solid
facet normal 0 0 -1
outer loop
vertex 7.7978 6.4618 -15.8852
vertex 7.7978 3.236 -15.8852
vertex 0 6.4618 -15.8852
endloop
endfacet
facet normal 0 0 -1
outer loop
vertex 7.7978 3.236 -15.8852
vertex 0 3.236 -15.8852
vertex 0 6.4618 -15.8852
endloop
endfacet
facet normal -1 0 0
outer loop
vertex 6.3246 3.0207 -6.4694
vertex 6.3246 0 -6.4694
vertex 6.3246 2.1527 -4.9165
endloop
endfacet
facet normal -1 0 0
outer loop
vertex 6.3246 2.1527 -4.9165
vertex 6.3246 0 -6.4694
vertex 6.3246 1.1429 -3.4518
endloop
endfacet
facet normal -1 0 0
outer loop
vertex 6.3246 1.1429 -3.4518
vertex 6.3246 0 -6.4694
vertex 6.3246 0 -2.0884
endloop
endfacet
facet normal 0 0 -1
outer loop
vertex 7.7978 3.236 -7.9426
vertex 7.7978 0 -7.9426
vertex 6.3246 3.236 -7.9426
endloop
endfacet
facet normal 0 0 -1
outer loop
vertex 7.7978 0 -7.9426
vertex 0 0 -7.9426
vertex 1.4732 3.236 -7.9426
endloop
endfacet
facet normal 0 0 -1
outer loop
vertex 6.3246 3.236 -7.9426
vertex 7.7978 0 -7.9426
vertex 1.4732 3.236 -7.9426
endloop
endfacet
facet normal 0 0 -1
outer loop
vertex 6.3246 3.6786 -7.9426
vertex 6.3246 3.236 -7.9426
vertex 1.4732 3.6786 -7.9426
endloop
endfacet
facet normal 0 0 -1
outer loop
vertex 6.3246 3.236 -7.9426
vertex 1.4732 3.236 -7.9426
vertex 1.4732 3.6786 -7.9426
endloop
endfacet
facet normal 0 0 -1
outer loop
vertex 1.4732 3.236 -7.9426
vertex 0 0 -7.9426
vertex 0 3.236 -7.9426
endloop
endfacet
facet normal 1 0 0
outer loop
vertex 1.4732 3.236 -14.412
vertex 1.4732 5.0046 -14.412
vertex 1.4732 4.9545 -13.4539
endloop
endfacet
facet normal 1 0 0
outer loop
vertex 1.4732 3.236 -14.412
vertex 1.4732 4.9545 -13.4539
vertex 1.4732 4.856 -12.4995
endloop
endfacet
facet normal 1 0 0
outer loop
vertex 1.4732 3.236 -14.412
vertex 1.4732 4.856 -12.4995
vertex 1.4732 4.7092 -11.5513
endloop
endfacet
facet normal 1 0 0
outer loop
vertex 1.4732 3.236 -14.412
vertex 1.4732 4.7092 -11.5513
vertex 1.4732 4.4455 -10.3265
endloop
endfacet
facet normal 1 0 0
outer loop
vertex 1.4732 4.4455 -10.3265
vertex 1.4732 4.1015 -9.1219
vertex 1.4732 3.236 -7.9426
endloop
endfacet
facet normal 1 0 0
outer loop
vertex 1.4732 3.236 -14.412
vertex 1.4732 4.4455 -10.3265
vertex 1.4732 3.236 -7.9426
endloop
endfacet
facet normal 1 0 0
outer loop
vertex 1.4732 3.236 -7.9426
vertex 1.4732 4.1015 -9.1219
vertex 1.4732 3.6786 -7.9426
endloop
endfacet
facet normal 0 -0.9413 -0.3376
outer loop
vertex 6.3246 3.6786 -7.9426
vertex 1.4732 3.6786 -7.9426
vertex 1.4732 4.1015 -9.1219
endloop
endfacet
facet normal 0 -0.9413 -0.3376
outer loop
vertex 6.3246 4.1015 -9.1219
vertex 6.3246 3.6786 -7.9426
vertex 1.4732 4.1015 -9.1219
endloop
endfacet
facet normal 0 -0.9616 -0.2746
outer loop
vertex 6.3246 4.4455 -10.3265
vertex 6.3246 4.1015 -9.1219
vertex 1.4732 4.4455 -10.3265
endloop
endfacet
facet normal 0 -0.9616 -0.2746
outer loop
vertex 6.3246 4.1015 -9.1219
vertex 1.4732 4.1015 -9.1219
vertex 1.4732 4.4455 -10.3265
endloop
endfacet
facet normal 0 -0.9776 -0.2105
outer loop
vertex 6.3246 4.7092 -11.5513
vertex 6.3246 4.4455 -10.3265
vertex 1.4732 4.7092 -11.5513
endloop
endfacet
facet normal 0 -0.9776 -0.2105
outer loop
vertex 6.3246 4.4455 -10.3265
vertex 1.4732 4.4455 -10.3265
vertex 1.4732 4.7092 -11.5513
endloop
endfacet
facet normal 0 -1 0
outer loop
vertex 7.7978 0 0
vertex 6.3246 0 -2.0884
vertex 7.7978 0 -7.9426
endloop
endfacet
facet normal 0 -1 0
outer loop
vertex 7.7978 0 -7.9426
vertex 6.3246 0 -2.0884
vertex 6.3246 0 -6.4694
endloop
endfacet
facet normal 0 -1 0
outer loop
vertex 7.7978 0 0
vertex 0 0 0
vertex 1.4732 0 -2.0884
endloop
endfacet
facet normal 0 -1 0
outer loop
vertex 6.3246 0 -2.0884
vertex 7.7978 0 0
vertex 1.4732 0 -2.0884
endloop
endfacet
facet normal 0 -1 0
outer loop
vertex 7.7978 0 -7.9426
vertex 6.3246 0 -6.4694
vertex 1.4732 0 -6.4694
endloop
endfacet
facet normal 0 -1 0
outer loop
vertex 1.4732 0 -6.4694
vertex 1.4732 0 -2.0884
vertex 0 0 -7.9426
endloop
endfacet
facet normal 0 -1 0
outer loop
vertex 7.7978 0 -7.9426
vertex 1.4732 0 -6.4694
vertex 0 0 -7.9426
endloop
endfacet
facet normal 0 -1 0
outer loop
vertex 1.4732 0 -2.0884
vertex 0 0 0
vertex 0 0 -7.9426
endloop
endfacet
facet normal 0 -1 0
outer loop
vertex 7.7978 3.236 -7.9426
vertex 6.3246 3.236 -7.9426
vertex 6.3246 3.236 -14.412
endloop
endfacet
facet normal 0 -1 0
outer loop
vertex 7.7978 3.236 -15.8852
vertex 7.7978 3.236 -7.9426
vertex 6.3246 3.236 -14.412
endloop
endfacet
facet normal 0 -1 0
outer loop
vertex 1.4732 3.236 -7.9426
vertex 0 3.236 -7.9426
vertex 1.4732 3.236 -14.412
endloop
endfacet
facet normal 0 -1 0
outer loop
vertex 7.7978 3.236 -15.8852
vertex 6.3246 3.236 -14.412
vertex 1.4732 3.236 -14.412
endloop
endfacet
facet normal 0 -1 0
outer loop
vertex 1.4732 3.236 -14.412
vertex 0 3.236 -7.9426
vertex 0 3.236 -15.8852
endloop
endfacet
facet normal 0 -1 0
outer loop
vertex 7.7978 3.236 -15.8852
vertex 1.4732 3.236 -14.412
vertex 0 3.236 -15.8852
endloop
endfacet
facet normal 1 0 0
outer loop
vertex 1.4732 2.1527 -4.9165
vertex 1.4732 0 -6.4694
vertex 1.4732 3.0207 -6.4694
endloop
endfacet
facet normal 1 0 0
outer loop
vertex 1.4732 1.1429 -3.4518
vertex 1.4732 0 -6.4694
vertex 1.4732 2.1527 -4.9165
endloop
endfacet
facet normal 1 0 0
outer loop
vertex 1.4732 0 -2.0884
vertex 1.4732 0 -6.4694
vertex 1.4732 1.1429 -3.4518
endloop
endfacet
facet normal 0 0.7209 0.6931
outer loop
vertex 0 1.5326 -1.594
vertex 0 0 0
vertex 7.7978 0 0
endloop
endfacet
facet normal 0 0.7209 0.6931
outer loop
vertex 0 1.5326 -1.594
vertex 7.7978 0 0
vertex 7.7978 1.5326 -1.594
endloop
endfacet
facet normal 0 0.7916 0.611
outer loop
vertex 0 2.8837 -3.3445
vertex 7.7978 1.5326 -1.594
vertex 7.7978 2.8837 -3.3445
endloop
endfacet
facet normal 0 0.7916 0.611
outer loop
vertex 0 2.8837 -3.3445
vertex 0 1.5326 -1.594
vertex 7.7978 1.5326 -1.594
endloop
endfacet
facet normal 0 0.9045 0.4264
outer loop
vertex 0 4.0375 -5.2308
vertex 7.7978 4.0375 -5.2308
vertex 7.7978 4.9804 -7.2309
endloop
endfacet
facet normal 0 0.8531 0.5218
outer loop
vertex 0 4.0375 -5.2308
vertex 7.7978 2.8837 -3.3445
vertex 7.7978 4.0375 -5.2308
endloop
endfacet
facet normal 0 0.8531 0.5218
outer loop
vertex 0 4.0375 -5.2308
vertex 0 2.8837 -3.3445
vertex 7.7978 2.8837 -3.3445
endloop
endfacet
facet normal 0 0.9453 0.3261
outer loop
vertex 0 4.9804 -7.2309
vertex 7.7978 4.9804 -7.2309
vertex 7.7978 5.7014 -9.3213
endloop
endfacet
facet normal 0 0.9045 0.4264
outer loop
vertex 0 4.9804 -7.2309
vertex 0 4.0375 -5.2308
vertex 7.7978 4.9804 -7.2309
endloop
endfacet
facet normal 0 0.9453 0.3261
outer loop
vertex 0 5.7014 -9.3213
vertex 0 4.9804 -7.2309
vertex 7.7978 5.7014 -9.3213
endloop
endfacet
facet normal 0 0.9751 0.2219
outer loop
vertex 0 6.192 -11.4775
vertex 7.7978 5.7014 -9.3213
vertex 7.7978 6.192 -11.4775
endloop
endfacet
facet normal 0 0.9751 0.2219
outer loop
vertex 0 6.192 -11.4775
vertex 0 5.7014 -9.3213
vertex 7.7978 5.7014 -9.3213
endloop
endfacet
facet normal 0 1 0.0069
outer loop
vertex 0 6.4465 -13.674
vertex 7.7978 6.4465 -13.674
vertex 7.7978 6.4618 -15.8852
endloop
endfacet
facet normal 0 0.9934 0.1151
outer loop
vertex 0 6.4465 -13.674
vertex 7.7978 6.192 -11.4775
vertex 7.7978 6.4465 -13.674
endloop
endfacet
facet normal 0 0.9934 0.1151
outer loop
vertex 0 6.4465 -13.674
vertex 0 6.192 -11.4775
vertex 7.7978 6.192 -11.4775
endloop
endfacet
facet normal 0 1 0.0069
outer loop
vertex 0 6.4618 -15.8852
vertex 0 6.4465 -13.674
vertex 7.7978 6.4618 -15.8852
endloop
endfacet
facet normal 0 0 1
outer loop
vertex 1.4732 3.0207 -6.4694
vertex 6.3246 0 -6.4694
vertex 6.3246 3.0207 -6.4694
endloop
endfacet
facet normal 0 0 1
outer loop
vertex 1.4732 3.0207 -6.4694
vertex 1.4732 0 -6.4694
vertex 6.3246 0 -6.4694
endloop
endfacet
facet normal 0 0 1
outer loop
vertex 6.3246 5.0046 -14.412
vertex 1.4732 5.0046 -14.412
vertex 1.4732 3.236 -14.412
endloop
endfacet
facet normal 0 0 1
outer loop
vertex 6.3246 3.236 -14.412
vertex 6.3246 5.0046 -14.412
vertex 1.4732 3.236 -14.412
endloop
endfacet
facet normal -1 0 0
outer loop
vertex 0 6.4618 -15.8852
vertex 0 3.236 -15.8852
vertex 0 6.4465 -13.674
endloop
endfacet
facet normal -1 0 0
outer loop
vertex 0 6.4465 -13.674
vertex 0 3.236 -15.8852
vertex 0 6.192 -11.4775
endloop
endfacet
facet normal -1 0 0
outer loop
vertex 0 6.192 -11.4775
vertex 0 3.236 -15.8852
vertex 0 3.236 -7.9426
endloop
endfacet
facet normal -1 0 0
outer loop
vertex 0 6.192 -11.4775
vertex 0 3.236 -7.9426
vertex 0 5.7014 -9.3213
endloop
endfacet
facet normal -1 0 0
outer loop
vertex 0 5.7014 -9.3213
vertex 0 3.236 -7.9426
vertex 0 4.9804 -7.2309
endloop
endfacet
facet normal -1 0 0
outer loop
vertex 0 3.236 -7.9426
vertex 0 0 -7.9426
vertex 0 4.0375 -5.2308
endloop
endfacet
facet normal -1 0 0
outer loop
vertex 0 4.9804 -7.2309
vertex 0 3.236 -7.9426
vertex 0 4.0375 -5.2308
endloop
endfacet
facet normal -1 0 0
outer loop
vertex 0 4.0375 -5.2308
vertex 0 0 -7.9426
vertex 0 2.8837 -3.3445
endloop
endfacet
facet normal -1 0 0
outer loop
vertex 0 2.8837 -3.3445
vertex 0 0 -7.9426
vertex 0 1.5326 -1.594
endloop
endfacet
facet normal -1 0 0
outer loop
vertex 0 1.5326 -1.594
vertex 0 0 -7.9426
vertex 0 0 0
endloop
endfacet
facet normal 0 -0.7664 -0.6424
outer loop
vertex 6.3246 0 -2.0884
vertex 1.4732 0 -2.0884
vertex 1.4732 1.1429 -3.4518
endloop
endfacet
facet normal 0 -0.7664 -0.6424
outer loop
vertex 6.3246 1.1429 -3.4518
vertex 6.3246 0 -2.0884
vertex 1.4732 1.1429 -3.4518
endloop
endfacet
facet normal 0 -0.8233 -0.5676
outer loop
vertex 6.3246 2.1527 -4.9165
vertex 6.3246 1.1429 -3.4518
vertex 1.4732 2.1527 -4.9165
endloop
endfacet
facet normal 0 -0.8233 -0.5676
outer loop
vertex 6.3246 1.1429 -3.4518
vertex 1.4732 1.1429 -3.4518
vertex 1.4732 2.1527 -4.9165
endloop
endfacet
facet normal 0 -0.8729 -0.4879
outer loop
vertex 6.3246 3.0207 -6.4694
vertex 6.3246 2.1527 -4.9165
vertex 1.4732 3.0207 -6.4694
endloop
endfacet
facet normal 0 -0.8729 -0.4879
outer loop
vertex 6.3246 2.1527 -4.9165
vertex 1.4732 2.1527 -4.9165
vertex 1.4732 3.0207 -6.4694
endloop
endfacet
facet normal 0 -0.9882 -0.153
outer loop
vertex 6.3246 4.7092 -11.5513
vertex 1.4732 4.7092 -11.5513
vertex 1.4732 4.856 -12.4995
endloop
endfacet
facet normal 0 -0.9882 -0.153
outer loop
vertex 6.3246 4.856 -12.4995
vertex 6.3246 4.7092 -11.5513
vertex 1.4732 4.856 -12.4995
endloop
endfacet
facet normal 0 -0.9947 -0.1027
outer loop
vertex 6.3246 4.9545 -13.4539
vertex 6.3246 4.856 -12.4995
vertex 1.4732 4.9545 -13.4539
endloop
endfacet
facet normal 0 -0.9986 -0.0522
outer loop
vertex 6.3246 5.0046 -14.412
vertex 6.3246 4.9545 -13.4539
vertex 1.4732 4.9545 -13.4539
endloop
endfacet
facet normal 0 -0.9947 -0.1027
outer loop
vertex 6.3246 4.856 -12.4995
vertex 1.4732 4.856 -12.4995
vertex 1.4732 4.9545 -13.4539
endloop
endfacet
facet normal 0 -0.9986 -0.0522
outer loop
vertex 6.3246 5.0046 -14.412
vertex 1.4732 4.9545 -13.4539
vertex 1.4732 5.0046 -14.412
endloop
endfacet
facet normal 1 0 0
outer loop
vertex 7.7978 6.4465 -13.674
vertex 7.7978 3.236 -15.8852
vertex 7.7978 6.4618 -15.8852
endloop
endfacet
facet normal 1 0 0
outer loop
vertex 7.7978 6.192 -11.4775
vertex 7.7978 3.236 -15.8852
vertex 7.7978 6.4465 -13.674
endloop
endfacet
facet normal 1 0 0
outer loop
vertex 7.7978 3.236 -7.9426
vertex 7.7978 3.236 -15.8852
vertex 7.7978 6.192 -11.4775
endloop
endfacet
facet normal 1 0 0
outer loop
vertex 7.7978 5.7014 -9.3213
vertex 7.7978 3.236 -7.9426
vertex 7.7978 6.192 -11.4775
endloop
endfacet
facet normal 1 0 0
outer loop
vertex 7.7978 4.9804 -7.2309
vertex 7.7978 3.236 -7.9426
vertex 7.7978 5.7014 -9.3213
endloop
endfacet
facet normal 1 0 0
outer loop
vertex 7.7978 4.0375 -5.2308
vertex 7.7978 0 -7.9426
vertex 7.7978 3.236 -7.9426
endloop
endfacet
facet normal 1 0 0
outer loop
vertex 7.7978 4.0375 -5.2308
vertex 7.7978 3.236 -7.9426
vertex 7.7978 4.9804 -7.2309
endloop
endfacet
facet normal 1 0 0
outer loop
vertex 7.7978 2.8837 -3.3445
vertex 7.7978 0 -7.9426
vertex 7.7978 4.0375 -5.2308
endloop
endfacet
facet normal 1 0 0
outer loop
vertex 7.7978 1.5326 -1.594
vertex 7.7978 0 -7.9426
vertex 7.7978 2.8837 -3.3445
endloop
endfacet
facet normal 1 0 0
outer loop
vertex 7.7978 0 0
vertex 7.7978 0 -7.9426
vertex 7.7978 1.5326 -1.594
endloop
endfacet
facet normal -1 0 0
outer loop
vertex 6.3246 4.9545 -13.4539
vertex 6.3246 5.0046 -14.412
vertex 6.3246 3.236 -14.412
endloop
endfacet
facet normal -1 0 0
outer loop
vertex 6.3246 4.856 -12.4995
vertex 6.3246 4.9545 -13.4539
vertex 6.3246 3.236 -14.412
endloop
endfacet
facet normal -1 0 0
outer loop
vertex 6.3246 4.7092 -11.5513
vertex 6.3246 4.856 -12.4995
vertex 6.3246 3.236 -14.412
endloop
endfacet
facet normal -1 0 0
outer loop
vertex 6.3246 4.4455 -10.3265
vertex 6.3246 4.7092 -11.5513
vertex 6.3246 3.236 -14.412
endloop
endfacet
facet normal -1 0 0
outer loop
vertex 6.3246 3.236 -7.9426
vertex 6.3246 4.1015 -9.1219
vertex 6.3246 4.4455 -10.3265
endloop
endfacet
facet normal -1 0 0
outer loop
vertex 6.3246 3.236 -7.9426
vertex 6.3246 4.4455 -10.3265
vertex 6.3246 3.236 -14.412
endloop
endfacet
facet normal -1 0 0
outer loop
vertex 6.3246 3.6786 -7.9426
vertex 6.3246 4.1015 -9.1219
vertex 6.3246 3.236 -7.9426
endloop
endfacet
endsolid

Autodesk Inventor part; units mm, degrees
ref_plane "YZ Plane" through (0, 0, 0) normal (1, 0, 0) x (0, 1, 0)
ref_plane "XZ Plane" through (0, 0, 0) normal (0, 1, 0) x (-1, 0, 0)
sketch "Sketch1" plane through (0, 0, 0) normal (1, 0, 0) x (0, 1, 0)
  line L0 (0, 0) -> (0, -7.9426)
  line L1 (0, -7.9426) -> (3.236, -7.9426)
  line L2 (3.236, -7.9426) -> (3.236, -15.8852)
  line L3 (3.236, -15.8852) -> (6.4618, -15.8852)
  arc A0 (6.4618, -15.8852) -> (0, 0) centre (-13.924, -14.9208) ccw
  dimension "d0" = 7.9426
  dimension "d1" = 3.236
  dimension "d2" = 7.9426
  dimension "d3" = 3.2258
extrude "Extrusion1" add sketch "Sketch1" along normal blind 7.7978
shell "Shell1" thickness 1.4732 removed faces 1 at (2.5993, 0, -2.6475)
ref_plane "Work Plane1" through (1.4732, 0, 0) normal (-1, 0, 0) x (0, 0, 1)
sketch "Sketch4" plane through (1.4732, 0, 0) normal (-1, 0, 0) x (0, 0, 1)
  line L0 (-7.9426, 3.236) -> (-15.8852, 3.236) projected
  line L1 (-15.8852, 3.236) -> (-15.8852, 6.4618) projected
  arc A0 (0, 0) -> (-15.8852, 6.4618) centre (-14.9208, -13.924) ccw projected
  line L2 (-14.412, 4.7092) -> (-14.412, 5.0045)
  arc A1 (-7.9426, 3.6786) -> (-14.412, 5.0045) centre (-14.9208, -13.924) ccw
  line L3 (-14.412, 5.0045) -> (-14.412, 3.236)
  line L4 (-7.9426, 3.236) -> (-15.8852, 3.236) projected
  line L5 (-7.9426, 3.236) -> (-7.9426, 3.6786)
extrude "Extrusion2" cut sketch "Sketch4" against normal blind 4.8514
properties part number "2x1 curve" material "ABS Plastic"
